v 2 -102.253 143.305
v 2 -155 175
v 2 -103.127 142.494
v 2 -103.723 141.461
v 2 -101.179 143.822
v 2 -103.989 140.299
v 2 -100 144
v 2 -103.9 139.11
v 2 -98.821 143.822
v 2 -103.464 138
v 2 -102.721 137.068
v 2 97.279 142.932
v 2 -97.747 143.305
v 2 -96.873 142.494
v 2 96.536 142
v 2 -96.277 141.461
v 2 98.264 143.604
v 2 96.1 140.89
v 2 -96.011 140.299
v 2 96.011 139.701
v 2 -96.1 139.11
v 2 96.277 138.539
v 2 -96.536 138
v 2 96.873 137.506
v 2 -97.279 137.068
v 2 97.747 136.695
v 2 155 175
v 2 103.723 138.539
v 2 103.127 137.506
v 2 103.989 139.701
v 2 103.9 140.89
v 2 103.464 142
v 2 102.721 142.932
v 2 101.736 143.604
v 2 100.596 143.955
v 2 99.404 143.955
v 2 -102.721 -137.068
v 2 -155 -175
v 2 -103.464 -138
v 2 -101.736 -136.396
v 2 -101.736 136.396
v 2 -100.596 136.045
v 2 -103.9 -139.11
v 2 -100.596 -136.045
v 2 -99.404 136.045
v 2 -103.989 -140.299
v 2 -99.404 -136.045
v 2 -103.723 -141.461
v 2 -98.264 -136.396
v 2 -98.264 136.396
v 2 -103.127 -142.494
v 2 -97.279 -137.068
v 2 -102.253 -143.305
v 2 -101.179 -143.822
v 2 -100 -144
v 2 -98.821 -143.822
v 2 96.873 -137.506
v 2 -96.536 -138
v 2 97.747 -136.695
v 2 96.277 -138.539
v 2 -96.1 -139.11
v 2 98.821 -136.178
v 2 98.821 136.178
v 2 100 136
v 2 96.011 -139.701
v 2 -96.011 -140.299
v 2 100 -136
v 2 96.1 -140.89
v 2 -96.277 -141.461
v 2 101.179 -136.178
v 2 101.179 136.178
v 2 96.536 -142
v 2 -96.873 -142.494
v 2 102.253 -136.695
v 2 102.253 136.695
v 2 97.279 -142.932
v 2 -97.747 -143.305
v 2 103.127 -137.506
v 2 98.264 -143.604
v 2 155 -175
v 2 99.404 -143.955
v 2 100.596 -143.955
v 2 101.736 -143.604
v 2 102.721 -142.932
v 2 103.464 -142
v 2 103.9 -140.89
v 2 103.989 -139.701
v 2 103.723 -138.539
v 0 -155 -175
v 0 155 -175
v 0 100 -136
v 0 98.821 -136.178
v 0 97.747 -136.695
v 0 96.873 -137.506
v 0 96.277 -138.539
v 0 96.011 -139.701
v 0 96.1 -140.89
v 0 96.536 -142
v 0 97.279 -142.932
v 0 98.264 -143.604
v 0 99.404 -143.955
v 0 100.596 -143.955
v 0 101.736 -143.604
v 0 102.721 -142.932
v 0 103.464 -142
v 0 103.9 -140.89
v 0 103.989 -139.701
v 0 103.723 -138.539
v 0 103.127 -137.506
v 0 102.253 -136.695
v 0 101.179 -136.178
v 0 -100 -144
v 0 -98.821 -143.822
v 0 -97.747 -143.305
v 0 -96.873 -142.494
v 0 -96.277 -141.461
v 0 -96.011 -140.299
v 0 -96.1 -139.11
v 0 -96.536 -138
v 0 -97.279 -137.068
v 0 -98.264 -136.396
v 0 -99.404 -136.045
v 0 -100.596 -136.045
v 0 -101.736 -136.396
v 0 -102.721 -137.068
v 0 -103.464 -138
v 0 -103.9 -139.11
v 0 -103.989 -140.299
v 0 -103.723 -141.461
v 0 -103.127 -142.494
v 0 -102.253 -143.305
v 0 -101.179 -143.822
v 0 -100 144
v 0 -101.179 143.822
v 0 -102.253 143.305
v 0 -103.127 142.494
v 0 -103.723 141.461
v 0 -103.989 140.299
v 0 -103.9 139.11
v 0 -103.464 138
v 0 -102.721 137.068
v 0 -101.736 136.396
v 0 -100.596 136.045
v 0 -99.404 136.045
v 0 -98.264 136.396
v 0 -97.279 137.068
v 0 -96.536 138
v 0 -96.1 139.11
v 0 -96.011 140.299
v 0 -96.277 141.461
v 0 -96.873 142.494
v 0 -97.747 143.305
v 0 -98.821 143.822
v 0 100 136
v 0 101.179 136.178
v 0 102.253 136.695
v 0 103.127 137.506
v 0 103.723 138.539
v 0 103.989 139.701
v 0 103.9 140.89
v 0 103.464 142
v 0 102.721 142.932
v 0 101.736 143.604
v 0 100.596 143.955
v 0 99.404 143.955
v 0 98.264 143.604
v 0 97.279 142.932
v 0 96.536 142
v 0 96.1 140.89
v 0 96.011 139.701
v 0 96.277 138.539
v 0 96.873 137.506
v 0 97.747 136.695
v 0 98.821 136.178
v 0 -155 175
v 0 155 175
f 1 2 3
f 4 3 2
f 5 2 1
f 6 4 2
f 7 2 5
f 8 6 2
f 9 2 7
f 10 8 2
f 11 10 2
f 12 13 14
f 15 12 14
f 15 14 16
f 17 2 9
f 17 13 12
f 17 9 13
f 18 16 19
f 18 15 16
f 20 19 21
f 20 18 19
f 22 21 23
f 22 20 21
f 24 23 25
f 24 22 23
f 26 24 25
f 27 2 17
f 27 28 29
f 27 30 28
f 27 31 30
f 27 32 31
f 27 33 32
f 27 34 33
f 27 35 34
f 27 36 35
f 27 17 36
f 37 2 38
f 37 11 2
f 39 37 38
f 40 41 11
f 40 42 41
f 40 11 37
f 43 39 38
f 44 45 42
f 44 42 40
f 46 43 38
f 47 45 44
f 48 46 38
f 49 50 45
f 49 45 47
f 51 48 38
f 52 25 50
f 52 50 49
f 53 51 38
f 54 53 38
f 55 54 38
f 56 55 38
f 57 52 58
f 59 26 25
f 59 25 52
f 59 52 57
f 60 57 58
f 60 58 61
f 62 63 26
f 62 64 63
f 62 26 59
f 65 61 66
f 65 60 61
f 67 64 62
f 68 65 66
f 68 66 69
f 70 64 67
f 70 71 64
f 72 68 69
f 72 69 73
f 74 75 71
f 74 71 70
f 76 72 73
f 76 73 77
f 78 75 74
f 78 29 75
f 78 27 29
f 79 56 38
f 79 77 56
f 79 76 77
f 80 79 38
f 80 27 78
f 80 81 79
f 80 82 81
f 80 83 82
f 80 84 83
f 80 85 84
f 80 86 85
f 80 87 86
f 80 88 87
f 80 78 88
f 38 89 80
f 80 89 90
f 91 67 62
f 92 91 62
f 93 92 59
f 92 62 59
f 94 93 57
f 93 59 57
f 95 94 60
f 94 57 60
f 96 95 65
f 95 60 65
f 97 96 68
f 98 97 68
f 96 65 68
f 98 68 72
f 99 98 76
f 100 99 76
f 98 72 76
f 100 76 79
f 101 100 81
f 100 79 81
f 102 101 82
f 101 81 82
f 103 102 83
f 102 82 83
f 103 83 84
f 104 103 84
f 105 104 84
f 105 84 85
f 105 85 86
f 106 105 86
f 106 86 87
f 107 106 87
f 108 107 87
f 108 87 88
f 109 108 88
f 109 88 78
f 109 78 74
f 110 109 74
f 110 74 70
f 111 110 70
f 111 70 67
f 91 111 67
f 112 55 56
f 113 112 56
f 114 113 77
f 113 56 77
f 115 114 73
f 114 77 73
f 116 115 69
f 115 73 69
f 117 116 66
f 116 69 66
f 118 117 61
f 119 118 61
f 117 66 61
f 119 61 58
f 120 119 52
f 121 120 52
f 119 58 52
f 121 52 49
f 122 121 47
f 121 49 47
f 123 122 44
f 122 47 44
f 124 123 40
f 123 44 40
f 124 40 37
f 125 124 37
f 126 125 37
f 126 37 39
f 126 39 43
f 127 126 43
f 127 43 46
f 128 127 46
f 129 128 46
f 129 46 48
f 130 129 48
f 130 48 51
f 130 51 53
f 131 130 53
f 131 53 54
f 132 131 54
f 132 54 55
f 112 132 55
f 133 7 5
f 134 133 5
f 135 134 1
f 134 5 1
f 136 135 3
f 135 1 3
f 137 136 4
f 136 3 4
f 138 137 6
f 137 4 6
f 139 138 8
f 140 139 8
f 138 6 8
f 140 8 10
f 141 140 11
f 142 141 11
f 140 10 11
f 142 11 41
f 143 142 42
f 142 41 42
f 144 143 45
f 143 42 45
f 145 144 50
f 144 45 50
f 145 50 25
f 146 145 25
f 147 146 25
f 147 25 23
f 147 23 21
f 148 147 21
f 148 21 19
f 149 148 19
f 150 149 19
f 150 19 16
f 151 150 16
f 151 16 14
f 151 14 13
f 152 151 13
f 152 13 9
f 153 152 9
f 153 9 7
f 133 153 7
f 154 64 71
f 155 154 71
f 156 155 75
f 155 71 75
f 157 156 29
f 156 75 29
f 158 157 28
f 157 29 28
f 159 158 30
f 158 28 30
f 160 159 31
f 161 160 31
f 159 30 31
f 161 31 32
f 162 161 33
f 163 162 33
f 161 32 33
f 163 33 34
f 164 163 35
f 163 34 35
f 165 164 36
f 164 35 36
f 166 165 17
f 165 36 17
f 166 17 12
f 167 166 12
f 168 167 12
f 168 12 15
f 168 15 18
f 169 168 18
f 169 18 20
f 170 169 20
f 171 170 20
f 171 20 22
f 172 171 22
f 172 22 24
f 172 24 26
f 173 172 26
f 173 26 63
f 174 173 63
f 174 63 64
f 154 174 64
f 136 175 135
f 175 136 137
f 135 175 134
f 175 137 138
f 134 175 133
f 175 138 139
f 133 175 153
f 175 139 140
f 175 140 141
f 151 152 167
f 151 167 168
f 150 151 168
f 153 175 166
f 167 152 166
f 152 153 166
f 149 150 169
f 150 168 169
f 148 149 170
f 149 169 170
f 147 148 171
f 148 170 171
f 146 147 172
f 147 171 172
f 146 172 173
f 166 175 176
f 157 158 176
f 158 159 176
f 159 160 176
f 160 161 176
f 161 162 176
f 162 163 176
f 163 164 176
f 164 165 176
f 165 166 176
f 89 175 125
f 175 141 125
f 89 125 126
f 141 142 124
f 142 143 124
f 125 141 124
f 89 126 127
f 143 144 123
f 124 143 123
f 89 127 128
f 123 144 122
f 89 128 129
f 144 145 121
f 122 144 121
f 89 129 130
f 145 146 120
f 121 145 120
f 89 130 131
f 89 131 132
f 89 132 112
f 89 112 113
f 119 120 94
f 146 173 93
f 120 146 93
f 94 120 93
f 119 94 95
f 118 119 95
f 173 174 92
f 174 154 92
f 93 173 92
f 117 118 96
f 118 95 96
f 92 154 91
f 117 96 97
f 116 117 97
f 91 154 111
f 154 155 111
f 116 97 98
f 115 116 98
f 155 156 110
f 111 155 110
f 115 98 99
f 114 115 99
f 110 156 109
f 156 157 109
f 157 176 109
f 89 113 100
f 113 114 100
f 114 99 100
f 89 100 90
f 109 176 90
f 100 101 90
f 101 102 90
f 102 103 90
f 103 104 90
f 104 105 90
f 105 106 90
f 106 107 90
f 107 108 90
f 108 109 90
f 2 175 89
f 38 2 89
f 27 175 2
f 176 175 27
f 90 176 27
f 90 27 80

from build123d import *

# Parameters (mm, degrees)
SKETCH1_W           = 350
SKETCH1_H           = 310
BOSS_EXTRUDE1_DEPTH = 2
SKETCH2_R           = 4
CUT_EXTRUDE1_DEPTH  = 234.781949688


with BuildPart() as part:
    # Sketch1 → Boss-Extrude1 (new body)
    with BuildSketch(Plane(origin=(0, 0, 0), x_dir=(0, 0, -1), z_dir=(1, 0, 0))):
        Rectangle(SKETCH1_W, SKETCH1_H)
    extrude(amount=BOSS_EXTRUDE1_DEPTH)

    # Sketch2 → Cut-Extrude1 (cut, through all)
    with BuildSketch(Plane(origin=(2, 0, 0), x_dir=(0, 0, -1), z_dir=(1, 0, 0))):
        with Locations((-140, 100)):
            Circle(SKETCH2_R)
        with Locations(Location((-140, -100, 0), (0, 0, 180))):
            Circle(SKETCH2_R)
        with Locations((140, -100)):
            Circle(SKETCH2_R)
        with Locations(Location((140, 100, 0), (0, 0, 180))):
            Circle(SKETCH2_R)
    extrude(amount=-CUT_EXTRUDE1_DEPTH, mode=Mode.SUBTRACT)


solid = part.part
